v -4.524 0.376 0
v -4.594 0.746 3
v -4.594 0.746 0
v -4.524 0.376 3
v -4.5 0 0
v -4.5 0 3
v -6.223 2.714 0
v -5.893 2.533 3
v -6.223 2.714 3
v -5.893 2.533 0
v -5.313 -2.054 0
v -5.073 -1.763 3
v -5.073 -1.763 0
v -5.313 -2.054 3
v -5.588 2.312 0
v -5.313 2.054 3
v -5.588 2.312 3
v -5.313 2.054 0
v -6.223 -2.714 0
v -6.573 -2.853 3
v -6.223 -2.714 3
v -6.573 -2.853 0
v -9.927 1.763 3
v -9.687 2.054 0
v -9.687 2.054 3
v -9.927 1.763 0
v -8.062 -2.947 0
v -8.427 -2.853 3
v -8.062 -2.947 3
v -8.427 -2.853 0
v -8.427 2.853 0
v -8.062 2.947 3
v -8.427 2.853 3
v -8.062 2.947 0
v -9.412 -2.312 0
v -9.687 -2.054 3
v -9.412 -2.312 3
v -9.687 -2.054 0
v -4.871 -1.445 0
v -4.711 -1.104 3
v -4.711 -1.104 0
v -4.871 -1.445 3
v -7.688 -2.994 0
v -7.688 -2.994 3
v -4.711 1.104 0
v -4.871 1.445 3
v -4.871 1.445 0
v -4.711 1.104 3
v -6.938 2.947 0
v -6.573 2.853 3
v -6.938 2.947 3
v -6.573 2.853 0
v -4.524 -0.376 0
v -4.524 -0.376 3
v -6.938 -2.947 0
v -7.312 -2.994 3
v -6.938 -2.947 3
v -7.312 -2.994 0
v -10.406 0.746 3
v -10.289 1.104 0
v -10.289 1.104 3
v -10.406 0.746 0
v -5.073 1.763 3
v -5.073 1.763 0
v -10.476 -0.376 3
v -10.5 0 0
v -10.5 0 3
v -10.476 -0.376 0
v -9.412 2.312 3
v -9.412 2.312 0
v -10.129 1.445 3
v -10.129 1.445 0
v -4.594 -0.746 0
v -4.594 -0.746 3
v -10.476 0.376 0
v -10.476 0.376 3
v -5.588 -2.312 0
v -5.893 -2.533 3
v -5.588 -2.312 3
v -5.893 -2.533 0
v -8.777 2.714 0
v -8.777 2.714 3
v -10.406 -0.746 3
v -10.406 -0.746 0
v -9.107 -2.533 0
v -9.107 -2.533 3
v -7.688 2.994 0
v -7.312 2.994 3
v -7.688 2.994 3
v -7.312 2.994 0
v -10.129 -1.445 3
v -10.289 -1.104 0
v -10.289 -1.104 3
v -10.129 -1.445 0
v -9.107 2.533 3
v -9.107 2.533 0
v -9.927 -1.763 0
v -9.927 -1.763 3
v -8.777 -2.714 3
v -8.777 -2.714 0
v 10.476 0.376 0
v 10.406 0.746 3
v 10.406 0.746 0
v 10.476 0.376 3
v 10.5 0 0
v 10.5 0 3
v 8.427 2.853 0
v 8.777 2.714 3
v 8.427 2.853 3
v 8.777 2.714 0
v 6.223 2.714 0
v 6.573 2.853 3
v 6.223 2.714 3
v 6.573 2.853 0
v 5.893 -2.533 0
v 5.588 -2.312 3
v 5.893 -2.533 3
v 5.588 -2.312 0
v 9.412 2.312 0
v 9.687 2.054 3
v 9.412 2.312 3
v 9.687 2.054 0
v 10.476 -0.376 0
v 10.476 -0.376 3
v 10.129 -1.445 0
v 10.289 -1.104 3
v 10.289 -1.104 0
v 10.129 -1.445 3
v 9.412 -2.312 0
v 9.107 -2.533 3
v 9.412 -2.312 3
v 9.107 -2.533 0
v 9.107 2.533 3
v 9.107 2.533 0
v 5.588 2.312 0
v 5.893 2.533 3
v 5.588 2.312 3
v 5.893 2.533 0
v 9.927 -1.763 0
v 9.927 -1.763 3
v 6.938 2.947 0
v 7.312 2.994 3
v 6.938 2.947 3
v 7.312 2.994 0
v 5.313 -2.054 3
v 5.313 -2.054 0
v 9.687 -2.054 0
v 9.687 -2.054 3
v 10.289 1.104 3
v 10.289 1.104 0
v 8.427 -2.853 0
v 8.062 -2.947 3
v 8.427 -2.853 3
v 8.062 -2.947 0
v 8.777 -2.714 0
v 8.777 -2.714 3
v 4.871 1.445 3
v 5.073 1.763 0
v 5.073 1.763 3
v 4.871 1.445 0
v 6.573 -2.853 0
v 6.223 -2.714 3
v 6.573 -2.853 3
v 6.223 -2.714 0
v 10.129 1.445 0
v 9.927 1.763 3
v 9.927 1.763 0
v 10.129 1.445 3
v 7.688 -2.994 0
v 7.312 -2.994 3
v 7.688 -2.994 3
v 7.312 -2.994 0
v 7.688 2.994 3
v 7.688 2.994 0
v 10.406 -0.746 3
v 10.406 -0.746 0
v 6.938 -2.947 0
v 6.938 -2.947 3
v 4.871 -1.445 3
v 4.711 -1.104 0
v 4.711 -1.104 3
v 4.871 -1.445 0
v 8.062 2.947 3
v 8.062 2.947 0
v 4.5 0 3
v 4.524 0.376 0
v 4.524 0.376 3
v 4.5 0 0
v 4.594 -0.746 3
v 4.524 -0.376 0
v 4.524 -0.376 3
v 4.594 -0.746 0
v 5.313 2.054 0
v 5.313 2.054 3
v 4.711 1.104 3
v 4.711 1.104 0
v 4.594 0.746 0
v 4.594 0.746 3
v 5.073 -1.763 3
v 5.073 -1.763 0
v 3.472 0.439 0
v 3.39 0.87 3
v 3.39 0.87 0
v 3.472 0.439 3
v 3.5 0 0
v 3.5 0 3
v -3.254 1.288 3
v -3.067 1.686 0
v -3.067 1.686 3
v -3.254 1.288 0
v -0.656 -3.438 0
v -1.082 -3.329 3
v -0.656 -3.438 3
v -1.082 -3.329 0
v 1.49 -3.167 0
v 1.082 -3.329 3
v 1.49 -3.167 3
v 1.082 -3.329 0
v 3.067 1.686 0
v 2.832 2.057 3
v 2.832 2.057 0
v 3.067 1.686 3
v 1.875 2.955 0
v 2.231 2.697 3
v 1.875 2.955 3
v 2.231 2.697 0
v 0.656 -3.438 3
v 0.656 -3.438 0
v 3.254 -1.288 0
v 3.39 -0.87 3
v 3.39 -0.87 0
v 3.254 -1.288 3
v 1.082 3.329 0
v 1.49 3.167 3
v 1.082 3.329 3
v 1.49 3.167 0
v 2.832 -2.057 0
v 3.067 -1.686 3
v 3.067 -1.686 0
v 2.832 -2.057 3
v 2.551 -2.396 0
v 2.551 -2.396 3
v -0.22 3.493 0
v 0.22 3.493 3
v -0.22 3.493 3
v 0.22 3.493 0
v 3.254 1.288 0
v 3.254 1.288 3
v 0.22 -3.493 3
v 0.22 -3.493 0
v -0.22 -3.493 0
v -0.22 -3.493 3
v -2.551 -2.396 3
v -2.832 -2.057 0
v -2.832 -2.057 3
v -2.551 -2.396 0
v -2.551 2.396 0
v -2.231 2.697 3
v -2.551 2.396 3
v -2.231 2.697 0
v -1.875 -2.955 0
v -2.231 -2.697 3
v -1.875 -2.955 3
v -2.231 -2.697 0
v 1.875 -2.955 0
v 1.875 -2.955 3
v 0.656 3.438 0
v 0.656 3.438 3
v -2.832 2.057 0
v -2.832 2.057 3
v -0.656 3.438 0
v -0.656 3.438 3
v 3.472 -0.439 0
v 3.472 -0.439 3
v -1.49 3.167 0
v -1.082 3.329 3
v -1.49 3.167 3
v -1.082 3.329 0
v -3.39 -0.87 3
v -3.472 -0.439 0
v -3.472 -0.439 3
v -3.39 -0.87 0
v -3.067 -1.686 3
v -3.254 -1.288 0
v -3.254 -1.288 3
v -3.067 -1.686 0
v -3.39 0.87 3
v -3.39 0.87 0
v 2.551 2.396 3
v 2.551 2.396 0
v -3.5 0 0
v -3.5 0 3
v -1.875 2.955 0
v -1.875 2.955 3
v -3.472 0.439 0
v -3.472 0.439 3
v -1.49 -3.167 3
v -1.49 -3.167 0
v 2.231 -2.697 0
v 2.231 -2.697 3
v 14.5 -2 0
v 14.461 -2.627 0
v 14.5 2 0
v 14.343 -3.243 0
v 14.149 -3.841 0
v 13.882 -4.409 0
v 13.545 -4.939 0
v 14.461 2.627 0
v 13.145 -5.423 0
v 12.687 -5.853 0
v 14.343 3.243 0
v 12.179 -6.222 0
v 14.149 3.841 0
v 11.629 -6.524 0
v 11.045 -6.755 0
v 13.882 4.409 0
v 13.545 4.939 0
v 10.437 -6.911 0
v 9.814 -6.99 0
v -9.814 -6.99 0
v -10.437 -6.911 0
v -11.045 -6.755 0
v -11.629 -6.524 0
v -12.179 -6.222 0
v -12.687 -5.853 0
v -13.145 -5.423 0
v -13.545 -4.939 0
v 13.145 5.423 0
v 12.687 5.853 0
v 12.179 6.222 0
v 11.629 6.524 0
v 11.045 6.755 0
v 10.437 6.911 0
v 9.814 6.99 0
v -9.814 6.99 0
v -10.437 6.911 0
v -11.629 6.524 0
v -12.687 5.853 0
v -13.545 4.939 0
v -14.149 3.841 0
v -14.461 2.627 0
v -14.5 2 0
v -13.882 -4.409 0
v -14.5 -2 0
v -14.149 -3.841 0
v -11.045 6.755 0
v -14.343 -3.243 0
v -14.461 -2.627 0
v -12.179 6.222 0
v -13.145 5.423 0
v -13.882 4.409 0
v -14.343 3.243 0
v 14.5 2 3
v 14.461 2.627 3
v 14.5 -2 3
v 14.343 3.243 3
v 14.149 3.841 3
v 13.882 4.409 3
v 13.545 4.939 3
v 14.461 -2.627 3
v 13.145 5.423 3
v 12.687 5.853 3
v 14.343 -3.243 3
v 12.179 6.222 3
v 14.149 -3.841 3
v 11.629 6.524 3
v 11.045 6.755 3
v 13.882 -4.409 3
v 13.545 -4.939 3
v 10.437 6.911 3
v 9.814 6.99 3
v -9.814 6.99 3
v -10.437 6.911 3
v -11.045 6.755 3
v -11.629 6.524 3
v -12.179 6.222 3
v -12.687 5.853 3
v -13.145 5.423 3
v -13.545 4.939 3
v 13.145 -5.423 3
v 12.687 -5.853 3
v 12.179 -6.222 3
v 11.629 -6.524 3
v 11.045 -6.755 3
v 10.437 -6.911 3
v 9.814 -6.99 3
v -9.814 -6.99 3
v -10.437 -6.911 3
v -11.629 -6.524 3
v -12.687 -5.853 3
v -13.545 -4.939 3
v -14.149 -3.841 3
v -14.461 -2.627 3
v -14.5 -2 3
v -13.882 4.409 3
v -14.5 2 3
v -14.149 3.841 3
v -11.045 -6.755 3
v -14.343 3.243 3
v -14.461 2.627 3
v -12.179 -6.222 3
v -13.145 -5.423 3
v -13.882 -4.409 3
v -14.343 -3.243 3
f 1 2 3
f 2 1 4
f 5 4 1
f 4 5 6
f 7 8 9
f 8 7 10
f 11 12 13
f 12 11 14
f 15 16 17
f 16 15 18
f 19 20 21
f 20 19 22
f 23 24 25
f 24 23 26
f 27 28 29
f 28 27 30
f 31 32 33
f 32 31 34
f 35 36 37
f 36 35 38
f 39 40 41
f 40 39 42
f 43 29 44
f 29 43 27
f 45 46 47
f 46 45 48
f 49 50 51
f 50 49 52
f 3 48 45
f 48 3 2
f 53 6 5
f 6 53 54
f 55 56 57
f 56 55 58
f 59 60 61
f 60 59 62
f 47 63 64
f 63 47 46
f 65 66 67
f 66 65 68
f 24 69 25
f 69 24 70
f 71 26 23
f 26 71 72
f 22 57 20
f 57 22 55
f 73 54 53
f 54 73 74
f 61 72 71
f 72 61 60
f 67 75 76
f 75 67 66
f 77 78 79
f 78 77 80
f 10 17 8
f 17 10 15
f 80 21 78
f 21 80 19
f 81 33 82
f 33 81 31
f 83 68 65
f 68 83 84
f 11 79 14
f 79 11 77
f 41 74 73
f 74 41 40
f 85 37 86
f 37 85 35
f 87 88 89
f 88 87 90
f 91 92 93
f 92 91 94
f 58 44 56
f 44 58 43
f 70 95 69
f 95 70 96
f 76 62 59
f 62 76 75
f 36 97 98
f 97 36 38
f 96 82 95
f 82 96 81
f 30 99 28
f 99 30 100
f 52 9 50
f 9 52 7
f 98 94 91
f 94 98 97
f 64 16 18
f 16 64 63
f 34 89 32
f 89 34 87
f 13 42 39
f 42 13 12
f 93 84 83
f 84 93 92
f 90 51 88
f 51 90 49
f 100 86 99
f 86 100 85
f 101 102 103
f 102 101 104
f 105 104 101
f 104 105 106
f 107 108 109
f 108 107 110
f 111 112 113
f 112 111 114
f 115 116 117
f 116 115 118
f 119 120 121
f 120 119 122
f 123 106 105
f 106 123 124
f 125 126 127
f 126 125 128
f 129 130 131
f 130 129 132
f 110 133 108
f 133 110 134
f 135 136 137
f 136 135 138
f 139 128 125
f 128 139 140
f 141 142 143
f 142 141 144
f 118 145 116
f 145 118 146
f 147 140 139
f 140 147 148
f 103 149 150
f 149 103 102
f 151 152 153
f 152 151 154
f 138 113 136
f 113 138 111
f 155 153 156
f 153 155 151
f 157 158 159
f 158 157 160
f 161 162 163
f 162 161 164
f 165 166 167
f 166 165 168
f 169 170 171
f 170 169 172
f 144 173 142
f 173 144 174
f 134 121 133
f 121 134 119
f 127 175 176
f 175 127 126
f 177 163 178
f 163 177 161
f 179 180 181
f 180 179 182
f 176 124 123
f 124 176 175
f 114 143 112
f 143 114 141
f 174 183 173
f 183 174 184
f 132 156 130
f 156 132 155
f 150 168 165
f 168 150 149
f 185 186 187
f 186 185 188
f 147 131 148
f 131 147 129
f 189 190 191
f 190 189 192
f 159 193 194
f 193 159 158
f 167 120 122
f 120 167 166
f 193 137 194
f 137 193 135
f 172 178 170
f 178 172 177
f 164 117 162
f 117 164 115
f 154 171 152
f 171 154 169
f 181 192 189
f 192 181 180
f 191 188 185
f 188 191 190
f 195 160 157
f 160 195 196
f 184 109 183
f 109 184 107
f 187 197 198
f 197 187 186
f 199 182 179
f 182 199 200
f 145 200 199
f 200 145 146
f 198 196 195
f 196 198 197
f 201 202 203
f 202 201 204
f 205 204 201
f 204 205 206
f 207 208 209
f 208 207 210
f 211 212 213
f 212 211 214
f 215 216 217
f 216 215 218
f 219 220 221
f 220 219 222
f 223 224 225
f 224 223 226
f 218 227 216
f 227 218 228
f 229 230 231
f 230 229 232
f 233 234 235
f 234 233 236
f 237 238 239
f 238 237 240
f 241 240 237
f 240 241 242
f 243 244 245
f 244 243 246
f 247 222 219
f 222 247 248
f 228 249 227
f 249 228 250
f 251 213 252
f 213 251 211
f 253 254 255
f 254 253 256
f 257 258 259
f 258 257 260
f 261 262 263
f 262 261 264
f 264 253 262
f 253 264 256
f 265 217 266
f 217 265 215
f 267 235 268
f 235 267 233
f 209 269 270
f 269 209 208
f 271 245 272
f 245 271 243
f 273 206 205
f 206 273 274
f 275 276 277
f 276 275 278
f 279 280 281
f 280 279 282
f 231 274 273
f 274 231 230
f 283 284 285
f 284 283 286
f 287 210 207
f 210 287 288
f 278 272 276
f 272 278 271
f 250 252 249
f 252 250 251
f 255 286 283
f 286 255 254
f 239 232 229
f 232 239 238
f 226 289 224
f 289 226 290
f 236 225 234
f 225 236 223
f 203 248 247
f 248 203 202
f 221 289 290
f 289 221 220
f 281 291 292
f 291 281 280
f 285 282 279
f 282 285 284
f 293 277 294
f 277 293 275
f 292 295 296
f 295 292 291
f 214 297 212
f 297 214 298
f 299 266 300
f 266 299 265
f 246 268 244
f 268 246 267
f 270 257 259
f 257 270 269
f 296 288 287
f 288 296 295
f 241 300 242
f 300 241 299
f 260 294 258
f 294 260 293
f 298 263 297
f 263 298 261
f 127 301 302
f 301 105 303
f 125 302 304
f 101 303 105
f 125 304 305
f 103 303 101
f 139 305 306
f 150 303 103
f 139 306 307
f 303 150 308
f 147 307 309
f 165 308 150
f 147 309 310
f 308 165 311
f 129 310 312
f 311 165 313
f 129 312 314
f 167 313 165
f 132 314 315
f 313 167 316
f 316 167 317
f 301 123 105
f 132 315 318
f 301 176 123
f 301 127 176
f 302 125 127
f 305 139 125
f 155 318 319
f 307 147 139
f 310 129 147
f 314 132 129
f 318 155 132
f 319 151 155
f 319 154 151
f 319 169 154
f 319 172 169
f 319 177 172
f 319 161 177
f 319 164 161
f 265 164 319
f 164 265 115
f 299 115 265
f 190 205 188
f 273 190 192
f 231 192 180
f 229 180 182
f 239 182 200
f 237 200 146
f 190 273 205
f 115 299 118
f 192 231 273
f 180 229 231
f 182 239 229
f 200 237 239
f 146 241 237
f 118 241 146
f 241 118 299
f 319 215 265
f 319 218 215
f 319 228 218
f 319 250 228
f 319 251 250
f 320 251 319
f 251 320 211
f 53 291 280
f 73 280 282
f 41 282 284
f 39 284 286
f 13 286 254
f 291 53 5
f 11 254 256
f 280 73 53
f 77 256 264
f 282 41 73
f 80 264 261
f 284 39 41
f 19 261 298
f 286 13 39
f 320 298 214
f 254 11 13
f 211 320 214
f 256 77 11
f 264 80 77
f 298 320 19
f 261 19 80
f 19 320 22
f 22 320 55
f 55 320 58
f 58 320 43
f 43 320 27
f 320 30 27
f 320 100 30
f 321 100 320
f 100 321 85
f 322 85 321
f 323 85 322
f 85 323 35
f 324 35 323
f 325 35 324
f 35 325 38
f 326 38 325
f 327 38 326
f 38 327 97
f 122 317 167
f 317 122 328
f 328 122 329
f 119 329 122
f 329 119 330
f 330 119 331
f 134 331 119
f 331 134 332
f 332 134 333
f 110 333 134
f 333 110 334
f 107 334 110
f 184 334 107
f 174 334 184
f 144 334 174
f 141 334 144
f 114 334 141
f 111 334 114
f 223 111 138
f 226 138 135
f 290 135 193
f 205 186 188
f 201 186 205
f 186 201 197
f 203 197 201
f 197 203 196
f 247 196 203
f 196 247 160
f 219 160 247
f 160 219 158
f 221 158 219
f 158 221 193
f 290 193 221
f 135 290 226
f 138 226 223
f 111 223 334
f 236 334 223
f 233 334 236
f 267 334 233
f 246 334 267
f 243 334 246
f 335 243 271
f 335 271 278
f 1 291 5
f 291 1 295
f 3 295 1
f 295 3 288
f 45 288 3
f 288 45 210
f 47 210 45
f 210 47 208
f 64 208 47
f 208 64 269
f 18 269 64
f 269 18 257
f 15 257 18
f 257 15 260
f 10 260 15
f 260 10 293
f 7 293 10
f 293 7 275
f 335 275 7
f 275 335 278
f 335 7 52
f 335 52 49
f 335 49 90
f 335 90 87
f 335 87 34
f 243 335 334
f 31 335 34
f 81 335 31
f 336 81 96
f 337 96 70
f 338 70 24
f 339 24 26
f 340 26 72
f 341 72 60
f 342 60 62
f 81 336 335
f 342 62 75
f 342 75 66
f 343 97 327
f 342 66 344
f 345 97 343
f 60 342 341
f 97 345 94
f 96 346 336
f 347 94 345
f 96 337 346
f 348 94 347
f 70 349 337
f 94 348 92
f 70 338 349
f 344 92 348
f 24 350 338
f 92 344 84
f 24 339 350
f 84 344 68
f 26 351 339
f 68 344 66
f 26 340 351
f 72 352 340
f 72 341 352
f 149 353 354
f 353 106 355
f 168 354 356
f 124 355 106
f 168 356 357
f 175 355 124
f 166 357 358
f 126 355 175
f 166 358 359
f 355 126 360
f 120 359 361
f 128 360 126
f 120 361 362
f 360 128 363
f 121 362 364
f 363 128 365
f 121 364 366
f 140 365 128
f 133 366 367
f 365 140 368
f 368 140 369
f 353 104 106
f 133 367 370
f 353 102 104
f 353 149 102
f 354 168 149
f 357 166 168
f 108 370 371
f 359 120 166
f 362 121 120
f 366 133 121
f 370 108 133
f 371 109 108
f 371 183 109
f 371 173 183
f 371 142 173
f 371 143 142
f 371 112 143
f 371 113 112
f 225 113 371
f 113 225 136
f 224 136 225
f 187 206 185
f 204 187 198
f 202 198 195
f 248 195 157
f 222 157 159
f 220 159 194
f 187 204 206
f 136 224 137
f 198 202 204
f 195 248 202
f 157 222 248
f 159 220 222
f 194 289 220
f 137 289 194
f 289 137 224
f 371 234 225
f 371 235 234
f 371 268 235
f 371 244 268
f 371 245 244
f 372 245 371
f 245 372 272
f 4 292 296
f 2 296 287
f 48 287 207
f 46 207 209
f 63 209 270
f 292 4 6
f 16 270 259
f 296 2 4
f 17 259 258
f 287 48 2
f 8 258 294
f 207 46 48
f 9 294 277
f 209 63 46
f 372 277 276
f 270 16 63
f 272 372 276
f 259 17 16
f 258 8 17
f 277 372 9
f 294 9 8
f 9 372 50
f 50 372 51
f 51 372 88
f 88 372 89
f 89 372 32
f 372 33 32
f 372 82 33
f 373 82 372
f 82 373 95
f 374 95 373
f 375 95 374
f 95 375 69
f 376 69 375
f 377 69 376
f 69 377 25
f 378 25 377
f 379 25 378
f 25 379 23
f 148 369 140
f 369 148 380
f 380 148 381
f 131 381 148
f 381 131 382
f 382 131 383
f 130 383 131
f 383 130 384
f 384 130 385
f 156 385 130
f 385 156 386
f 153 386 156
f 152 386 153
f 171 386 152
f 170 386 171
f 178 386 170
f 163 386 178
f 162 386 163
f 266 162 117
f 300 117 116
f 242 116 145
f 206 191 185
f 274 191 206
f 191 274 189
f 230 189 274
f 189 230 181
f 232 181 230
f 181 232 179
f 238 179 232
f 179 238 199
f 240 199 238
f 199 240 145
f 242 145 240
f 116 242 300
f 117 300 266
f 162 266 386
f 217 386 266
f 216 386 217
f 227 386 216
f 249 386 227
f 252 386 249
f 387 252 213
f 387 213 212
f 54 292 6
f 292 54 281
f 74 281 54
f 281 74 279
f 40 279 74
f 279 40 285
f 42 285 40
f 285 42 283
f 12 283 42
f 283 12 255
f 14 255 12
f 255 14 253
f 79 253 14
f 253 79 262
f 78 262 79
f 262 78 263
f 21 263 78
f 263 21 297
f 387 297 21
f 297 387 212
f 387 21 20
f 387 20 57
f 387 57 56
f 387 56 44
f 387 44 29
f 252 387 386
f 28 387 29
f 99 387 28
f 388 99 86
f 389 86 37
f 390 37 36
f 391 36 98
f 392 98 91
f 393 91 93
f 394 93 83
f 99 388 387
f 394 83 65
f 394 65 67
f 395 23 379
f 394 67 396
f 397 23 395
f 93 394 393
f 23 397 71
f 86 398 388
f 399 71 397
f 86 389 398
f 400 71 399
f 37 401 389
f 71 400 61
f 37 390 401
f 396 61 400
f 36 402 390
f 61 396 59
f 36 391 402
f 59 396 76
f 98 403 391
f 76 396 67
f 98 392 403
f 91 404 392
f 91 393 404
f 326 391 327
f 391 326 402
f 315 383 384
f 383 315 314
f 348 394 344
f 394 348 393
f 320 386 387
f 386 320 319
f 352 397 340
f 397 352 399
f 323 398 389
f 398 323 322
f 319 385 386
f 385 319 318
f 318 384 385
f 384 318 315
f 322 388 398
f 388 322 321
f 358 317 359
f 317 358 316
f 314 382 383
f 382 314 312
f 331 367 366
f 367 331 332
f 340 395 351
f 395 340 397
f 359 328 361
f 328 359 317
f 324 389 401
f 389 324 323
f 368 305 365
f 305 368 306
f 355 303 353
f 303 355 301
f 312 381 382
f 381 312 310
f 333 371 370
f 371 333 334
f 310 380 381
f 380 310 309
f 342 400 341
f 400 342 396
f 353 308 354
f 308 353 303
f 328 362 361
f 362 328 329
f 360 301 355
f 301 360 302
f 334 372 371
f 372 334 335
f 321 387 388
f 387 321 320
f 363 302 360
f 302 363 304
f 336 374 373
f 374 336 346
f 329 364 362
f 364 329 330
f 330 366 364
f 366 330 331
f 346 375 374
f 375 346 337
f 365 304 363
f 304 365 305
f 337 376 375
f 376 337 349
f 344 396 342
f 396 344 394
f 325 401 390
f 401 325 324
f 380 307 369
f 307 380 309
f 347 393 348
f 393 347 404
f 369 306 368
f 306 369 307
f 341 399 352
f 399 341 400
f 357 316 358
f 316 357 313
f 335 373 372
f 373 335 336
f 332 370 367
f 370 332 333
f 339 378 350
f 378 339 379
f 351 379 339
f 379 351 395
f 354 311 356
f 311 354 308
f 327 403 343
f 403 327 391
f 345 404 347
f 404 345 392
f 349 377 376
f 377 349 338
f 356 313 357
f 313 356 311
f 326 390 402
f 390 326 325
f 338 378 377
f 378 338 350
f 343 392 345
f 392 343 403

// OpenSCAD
$fn = 50;


difference() {
	union() {
		hull() {
			translate(v = [-9.5000000000, 2.0000000000, 0]) {
				cylinder(h = 3, r = 5);
			}
			translate(v = [9.5000000000, 2.0000000000, 0]) {
				cylinder(h = 3, r = 5);
			}
			translate(v = [-9.5000000000, -2.0000000000, 0]) {
				cylinder(h = 3, r = 5);
			}
			translate(v = [9.5000000000, -2.0000000000, 0]) {
				cylinder(h = 3, r = 5);
			}
		}
	}
	union() {
		#translate(v = [-7.5000000000, 0.0000000000, 0]) {
			cylinder(h = 3, r = 3.0000000000);
		}
		#translate(v = [7.5000000000, 0.0000000000, 0]) {
			cylinder(h = 3, r = 3.0000000000);
		}
		#translate(v = [-7.5000000000, 0.0000000000, -100.0000000000]) {
			cylinder(h = 200, r = 3.0000000000);
		}
		#translate(v = [-7.5000000000, 0.0000000000, -100.0000000000]) {
			cylinder(h = 200, r = 3.0000000000);
		}
		#translate(v = [7.5000000000, 0.0000000000, -100.0000000000]) {
			cylinder(h = 200, r = 3.0000000000);
		}
		#translate(v = [7.5000000000, 0.0000000000, -100.0000000000]) {
			cylinder(h = 200, r = 3.0000000000);
		}
		#translate(v = [-7.5000000000, 0.0000000000, 0]) {
			cylinder(h = 3, r = 1.5000000000);
		}
		#translate(v = [7.5000000000, 0.0000000000, 0]) {
			cylinder(h = 3, r = 1.5000000000);
		}
		#translate(v = [-7.5000000000, 0.0000000000, 0]) {
			cylinder(h = 3, r = 1.5000000000);
		}
		#translate(v = [7.5000000000, 0.0000000000, 0]) {
			cylinder(h = 3, r = 1.5000000000);
		}
		#translate(v = [-7.5000000000, 0.0000000000, 0]) {
			cylinder(h = 3, r = 1.5000000000);
		}
		#translate(v = [7.5000000000, 0.0000000000, 0]) {
			cylinder(h = 3, r = 1.5000000000);
		}
		#cylinder(h = 3, r = 3.5000000000);
	}
}
